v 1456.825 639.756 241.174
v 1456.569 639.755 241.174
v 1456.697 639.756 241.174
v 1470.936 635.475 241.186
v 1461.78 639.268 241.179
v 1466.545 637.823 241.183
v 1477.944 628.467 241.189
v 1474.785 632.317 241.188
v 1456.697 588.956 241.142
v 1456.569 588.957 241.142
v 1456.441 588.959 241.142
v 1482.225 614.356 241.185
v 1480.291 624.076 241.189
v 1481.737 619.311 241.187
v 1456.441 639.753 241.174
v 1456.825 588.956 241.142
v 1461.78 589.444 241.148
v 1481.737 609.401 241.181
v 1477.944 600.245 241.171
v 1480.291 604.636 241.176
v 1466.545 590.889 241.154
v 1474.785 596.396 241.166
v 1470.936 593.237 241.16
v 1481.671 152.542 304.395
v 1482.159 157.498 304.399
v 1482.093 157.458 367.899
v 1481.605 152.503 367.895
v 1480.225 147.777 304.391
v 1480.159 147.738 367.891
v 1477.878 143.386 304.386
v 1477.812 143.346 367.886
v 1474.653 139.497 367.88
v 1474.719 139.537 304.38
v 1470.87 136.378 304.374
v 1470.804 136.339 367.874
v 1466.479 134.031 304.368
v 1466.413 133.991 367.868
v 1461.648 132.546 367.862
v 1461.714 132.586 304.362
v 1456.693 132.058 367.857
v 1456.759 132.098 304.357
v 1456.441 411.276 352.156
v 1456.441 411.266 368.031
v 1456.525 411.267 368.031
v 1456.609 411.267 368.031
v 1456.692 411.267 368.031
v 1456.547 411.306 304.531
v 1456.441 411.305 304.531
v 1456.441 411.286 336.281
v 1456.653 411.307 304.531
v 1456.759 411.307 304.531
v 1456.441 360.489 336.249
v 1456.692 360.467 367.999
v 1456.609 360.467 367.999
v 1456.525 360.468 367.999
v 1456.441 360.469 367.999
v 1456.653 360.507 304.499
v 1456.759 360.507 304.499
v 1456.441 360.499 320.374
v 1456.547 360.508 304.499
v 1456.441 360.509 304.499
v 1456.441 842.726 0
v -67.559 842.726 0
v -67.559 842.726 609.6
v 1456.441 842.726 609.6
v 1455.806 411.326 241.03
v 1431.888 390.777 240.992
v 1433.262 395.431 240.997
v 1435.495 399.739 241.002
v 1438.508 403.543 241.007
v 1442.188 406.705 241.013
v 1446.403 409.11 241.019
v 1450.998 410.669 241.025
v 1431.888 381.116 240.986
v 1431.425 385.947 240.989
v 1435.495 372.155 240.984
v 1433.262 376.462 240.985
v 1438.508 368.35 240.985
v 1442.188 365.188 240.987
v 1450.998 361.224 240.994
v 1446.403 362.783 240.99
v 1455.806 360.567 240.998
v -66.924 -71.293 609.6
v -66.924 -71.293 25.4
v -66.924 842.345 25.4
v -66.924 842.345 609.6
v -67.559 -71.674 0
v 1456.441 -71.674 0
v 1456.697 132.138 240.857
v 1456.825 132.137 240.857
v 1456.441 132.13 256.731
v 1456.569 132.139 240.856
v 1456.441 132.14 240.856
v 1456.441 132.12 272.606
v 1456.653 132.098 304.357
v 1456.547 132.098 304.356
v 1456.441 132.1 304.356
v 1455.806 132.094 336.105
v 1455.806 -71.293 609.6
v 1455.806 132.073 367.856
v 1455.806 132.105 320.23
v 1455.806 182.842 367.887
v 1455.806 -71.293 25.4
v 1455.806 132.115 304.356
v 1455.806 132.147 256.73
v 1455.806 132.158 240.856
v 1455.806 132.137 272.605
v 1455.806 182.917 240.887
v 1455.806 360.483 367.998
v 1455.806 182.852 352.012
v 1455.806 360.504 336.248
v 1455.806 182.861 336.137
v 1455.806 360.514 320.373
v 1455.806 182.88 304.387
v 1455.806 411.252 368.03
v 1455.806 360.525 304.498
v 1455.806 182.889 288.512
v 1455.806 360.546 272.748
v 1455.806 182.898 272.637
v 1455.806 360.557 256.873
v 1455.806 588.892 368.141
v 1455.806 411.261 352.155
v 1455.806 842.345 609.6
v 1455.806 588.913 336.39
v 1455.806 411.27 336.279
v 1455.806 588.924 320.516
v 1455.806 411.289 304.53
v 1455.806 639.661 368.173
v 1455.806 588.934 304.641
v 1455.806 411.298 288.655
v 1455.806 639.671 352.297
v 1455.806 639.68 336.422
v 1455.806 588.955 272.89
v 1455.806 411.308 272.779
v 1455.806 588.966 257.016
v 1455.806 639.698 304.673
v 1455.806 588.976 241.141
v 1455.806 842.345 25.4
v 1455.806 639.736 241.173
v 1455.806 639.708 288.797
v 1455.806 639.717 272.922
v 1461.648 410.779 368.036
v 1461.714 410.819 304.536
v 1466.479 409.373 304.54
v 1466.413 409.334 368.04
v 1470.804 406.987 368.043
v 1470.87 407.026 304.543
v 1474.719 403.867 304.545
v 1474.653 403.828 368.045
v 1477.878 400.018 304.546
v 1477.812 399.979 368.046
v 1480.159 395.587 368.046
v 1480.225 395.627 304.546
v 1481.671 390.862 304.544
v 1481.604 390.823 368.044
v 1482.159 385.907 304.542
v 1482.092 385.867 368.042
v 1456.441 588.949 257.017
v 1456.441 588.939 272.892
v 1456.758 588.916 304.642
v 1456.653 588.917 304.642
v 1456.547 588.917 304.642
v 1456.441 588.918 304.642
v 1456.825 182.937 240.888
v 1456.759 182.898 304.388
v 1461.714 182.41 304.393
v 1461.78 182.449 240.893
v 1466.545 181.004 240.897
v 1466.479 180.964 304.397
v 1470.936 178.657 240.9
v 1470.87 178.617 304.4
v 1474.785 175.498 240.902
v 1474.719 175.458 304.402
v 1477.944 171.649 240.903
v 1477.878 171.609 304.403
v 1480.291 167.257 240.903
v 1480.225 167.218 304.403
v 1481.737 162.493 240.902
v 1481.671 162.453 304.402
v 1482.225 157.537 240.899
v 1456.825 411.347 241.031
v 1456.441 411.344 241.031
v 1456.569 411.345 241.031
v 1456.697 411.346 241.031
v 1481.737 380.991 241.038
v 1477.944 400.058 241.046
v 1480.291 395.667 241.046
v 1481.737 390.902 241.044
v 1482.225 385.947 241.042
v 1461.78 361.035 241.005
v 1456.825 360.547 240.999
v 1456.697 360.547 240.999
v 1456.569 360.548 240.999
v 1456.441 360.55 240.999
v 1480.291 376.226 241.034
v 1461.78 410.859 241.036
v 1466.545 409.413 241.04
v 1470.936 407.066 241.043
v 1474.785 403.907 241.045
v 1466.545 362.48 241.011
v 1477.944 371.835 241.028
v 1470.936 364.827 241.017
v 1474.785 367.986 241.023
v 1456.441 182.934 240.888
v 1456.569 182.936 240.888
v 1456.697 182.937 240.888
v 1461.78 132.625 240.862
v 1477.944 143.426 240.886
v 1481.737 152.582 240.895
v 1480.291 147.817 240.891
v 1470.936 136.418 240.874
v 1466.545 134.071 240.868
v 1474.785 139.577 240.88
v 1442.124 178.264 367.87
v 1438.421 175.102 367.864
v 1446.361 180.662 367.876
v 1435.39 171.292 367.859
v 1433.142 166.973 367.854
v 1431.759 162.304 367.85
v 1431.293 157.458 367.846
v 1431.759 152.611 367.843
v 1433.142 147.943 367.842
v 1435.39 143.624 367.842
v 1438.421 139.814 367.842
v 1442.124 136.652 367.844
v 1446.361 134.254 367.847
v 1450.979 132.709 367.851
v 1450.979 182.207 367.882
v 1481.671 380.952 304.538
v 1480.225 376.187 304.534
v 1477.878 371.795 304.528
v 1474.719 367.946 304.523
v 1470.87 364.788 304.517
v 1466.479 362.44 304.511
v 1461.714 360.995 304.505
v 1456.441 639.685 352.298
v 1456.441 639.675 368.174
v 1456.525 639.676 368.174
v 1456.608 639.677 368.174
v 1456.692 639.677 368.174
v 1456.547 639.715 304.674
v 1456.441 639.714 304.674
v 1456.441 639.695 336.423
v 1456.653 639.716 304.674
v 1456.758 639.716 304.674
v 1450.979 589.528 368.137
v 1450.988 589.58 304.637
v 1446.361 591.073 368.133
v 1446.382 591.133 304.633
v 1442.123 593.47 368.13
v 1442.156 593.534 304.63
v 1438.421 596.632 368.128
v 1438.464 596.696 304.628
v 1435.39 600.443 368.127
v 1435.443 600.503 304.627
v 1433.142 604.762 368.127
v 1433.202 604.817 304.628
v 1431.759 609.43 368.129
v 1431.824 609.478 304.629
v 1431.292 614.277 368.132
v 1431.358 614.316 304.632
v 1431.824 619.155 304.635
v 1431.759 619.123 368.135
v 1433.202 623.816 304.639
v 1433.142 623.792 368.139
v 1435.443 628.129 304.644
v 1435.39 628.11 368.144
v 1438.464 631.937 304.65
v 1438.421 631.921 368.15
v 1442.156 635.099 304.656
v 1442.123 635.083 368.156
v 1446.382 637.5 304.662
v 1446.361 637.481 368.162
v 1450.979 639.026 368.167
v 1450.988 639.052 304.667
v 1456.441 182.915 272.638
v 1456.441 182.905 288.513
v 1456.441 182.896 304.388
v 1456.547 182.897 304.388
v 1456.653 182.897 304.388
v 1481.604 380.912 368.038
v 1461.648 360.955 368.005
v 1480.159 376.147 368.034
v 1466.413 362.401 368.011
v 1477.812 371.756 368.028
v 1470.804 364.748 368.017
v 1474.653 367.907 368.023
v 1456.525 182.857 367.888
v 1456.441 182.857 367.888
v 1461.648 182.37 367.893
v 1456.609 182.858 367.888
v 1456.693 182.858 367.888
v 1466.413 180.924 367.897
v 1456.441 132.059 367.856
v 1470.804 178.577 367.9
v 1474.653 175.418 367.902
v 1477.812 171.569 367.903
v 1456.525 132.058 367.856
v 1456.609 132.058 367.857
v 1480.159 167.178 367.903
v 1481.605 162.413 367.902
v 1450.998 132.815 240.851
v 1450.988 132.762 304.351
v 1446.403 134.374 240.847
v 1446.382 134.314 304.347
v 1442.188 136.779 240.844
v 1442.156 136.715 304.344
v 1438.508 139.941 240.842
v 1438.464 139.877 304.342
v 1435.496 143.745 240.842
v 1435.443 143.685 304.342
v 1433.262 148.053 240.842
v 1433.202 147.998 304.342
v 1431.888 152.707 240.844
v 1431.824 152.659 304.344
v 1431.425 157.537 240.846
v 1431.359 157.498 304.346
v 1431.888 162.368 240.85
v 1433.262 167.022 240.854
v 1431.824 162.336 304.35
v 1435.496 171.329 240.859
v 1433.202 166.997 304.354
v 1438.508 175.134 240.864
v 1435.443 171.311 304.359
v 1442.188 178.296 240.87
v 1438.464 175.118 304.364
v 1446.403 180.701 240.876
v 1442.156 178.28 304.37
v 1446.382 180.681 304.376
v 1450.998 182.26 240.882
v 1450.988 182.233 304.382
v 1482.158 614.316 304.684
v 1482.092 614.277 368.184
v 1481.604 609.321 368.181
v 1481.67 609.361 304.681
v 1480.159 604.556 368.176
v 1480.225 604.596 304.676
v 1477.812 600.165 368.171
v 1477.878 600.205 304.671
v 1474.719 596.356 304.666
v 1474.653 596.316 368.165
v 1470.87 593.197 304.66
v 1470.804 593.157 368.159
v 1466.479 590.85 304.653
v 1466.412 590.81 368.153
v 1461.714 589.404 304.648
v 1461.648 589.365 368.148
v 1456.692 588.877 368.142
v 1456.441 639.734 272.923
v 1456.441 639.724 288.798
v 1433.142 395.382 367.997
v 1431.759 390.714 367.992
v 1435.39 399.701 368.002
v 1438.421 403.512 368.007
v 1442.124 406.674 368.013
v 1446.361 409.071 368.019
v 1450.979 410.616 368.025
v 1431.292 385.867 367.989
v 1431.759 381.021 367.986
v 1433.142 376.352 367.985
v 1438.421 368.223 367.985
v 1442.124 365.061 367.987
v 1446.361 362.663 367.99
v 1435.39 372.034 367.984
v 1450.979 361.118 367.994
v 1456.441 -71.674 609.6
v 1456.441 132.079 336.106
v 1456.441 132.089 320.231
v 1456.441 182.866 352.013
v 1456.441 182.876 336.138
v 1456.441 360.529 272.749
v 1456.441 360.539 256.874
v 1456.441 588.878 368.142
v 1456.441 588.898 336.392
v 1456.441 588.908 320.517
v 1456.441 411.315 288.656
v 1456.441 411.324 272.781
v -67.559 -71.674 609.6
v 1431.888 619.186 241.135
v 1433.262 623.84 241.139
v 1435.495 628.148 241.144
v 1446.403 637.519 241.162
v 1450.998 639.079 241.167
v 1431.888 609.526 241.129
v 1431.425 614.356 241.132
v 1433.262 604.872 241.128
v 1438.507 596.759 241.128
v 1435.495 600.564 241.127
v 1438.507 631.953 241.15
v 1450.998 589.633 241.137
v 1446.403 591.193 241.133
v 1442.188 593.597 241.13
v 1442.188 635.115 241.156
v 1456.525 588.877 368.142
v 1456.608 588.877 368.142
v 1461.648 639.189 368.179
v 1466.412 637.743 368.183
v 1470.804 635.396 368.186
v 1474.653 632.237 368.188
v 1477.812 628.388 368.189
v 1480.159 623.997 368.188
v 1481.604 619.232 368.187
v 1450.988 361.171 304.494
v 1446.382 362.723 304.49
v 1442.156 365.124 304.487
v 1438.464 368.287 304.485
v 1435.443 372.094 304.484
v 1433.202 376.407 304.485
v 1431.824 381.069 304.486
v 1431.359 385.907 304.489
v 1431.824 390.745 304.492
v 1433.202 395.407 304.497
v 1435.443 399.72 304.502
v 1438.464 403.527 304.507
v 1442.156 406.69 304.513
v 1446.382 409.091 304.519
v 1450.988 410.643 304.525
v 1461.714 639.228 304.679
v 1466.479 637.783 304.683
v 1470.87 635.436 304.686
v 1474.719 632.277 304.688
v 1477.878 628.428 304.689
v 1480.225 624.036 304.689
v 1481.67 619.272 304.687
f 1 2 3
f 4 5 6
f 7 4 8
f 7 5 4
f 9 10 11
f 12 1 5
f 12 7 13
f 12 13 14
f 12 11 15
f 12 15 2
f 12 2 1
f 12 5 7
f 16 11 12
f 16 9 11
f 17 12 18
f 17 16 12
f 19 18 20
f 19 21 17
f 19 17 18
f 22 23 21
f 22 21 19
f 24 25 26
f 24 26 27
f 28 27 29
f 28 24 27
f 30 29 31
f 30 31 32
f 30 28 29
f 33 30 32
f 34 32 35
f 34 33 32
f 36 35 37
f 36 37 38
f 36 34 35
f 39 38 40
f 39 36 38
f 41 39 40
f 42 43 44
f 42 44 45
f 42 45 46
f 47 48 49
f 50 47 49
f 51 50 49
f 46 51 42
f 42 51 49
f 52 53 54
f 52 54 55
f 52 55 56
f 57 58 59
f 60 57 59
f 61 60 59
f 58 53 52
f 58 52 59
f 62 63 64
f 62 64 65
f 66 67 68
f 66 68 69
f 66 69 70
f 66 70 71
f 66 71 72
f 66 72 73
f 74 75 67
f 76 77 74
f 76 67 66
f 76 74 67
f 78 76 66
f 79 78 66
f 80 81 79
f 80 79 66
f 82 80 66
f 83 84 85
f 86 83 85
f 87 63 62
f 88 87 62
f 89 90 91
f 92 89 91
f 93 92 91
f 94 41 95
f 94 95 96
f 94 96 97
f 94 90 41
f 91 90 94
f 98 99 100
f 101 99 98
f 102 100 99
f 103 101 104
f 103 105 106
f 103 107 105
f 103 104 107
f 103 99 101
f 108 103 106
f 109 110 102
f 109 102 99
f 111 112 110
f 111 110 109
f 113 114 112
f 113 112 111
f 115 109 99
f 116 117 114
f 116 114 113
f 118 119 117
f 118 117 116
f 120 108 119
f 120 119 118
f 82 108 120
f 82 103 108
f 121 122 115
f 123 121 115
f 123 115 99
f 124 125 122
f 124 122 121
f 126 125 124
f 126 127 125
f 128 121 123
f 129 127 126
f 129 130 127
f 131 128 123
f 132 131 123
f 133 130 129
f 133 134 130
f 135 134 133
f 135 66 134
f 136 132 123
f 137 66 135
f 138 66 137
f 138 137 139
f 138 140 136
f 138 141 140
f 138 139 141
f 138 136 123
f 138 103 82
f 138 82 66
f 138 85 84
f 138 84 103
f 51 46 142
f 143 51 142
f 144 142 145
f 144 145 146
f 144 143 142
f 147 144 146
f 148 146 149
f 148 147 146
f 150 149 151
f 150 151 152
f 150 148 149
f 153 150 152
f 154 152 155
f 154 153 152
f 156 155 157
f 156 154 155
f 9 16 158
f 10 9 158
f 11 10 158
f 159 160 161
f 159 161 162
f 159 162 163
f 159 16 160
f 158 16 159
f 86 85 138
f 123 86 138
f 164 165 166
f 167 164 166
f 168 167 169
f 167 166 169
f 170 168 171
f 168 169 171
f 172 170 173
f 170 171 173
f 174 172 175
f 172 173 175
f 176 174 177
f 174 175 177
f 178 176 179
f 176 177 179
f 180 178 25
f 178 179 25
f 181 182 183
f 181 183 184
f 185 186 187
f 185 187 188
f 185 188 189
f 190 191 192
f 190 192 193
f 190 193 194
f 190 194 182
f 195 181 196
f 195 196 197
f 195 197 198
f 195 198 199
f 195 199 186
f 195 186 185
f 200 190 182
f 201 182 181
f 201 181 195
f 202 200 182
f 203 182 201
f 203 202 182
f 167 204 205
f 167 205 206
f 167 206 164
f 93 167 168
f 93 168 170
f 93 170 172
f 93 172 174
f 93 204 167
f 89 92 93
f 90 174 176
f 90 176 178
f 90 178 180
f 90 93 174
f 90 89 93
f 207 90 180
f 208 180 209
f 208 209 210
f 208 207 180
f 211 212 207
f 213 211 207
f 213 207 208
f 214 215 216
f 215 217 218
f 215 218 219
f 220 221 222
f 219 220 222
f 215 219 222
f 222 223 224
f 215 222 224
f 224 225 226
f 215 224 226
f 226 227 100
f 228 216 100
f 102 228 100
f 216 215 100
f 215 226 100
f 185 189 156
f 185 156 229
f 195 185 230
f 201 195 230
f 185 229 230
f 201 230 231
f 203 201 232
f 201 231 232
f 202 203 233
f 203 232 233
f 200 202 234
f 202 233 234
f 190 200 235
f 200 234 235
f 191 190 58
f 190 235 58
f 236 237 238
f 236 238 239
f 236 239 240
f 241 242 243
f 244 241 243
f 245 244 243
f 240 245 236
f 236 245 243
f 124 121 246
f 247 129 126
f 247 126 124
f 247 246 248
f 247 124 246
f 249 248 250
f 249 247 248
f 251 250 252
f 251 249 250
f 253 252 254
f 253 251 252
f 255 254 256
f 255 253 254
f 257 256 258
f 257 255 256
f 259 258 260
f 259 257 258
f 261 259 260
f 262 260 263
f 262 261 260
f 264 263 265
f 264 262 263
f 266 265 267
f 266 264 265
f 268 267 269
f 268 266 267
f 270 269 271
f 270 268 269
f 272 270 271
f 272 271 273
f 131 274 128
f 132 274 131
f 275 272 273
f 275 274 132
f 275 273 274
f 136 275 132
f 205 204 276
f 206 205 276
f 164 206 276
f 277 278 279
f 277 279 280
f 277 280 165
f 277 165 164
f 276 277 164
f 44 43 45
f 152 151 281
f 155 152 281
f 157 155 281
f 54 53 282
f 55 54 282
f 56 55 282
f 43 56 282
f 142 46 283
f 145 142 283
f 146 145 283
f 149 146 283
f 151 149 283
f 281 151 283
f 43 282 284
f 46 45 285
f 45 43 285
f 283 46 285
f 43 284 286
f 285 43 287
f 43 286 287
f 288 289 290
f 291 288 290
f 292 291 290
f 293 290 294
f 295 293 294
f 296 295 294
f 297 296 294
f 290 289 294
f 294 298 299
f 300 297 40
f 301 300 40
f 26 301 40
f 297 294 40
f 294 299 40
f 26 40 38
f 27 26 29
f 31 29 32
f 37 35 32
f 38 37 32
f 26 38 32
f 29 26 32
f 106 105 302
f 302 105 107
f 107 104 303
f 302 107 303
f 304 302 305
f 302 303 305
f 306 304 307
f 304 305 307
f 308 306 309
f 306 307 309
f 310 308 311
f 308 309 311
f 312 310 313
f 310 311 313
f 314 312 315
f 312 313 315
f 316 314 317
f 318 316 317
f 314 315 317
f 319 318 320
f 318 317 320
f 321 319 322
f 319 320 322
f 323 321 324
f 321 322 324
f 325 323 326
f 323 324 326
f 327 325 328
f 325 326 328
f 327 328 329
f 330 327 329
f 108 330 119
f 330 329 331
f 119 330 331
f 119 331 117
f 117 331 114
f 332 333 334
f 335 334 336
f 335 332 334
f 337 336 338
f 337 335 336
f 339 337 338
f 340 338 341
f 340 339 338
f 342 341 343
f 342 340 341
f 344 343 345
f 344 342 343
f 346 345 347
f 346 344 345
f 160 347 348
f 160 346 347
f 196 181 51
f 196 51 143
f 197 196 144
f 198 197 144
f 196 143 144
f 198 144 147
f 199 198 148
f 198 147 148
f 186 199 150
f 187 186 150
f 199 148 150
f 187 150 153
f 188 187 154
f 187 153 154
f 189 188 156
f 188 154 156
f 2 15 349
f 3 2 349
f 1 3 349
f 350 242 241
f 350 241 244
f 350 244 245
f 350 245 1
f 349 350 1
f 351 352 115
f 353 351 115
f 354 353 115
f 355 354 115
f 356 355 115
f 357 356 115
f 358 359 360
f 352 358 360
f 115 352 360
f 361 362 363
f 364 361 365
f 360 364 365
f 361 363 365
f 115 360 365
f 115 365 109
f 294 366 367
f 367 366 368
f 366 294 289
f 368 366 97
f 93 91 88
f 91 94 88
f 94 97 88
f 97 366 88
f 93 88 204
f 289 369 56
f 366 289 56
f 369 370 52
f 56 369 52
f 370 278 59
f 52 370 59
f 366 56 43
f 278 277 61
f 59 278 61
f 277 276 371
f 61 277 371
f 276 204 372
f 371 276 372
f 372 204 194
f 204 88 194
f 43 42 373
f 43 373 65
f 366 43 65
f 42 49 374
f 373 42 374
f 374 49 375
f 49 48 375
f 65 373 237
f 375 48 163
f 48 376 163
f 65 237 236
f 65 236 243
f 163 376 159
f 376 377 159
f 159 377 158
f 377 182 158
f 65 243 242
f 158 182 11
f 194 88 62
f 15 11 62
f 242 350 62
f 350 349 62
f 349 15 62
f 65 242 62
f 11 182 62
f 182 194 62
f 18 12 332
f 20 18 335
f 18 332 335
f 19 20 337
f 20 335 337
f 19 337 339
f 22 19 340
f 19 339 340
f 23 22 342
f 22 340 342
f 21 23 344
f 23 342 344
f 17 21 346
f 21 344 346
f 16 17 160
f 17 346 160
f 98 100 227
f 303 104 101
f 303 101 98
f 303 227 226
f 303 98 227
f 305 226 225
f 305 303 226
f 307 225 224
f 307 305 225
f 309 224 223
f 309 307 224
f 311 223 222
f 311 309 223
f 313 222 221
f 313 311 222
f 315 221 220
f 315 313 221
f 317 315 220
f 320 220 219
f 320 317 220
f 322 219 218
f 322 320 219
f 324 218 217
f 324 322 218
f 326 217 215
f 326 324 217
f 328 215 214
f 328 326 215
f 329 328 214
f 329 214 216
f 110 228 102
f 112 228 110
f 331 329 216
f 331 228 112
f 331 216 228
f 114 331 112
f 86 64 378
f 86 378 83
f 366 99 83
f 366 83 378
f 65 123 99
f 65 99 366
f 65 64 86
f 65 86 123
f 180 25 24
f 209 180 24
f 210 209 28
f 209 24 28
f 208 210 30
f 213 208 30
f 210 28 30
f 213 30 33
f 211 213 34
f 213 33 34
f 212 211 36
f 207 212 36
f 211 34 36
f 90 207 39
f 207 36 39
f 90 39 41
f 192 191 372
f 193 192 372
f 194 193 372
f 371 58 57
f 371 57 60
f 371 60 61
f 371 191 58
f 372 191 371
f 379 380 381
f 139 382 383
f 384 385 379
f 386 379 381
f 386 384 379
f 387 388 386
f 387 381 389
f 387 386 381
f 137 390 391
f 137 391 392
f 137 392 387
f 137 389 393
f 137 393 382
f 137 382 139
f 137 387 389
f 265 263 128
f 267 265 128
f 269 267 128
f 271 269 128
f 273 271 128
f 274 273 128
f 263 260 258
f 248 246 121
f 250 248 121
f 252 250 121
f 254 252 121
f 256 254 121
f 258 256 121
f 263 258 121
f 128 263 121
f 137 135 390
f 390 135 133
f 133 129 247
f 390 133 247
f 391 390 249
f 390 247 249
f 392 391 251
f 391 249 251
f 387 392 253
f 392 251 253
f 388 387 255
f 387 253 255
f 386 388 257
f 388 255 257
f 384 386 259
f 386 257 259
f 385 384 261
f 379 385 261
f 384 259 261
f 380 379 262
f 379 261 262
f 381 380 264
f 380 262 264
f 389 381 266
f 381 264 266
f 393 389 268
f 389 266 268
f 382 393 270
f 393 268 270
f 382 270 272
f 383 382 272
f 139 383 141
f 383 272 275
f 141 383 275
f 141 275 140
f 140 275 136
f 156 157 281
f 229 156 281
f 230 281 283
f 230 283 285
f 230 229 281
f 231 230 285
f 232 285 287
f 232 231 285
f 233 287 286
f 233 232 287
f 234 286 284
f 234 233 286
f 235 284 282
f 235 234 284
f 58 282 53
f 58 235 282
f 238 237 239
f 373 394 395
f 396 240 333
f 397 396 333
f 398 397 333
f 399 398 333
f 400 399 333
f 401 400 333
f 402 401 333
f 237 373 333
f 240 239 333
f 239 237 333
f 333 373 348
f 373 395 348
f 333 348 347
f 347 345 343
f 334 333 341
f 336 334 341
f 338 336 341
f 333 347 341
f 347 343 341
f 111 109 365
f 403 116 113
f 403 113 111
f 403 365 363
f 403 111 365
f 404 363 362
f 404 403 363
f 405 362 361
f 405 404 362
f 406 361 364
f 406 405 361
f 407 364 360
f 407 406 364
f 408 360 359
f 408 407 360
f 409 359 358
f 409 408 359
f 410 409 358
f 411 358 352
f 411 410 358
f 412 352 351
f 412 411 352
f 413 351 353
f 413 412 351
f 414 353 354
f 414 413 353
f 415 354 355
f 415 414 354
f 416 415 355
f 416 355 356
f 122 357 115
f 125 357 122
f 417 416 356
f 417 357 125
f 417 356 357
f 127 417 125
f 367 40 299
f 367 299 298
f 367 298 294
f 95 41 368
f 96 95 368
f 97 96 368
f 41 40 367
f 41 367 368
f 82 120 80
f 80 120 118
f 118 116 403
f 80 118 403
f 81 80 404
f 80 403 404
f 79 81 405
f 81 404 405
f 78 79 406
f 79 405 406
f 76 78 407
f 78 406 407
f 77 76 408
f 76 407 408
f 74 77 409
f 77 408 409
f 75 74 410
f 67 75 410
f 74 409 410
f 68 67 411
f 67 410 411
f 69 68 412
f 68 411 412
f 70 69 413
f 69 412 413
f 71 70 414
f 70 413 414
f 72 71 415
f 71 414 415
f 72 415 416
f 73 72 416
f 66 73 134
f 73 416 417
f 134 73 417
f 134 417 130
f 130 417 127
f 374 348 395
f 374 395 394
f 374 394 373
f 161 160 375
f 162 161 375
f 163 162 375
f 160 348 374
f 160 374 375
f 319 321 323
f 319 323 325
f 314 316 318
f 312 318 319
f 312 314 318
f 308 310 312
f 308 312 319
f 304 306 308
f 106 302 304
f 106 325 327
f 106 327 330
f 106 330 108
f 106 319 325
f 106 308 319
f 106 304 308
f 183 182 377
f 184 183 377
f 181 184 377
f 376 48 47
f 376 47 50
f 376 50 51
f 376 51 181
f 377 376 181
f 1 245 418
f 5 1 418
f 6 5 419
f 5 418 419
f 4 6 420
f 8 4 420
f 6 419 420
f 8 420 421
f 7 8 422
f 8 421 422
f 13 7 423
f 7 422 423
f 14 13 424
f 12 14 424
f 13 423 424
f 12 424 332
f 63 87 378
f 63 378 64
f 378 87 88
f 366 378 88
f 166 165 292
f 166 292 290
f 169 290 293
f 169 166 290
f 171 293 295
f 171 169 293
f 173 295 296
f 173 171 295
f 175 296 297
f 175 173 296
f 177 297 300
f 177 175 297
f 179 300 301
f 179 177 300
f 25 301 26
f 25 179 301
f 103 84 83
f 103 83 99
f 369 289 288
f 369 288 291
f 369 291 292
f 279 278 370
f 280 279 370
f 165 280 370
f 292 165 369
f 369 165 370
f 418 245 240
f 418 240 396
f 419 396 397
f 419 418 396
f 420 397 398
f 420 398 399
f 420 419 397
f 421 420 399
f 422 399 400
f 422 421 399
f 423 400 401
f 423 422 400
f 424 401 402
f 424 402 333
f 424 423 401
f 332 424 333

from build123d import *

# Parameters (mm, degrees)
F1_W     = 1524
F1_H     = 914.4
F1_W_2   = 1522.73
F1_H_2   = 913.638
F2_DEPTH = 609.6
F0_W     = 1524
F0_H     = 914.4
F3_DEPTH = 25.4
F6_DEPTH = 63.5


with BuildPart() as f2:
    # F1 (on face) → F2 (new body)
    with BuildSketch(Plane.XY):
        with Locations((694.4408099055, 385.5257871866)):
            Rectangle(F1_W, F1_H)
        with Locations((694.4408099055, 385.5257871866)):
            Rectangle(F1_W_2, F1_H_2, mode=Mode.SUBTRACT)
    extrude(amount=F2_DEPTH)

    # F1 (on face) + F0 (on Top) → F3 (join)
    with BuildSketch(Plane.XY):
        with Locations((694.4408099055, 385.5257871866)):
            Rectangle(F1_W_2, F1_H_2)
    with BuildSketch(Plane.XY):
        with Locations((694.4408099055, 385.5257871866)):
            Rectangle(F0_W, F0_H)
    extrude(amount=F3_DEPTH)

    # F5 (on mid) → F6 (join, symmetric)
    with BuildSketch(Plane(origin=(-0.3153710141, -0.1892226085, 302.7561735554), x_dir=(0.9999994575, -6.51e-07, 0.0010416657), z_dir=(0.0010416659, 0.0006249995, -0.9999992622))):
        with BuildLine():
            ThreePointArc((1482.474916731, -157.6878010367), (1475.0354348197, -139.727294641), (1457.0749332675, -132.2878010367))
            Line((1457.0749332675, -132.2878010367), (1457.074916731, -157.6878010367))
            Line((1457.074916731, -157.6878010367), (1457.0749001946, -183.0878010367))
            ThreePointArc((1457.0749001946, -183.0878010367), (1475.0354231266, -175.6483191253), (1482.474916731, -157.6878010367))
        make_face()
        with BuildLine():
            ThreePointArc((1482.4747680271, -386.097211777), (1475.0352861157, -368.1367053814), (1457.0747845635, -360.697211777))
            Line((1457.0747845635, -360.697211777), (1457.0747680271, -386.097211777))
            Line((1457.0747680271, -386.097211777), (1457.0747514906, -411.497211777))
            ThreePointArc((1457.0747514906, -411.497211777), (1475.0352744227, -404.0577298657), (1482.4747680271, -386.097211777))
        make_face()
        with BuildLine():
            ThreePointArc((1482.4746193231, -614.5066225174), (1475.0351374118, -596.5461161218), (1457.0746358596, -589.1066225174))
            Line((1457.0746358596, -589.1066225174), (1457.0746193231, -614.5066225174))
            Line((1457.0746193231, -614.5066225174), (1457.0746027867, -639.9066225174))
            ThreePointArc((1457.0746027867, -639.9066225174), (1475.0351257188, -632.467140606), (1482.4746193231, -614.5066225174))
        make_face()
        with BuildLine():
            Line((1457.0746193231, -614.5066225174), (1457.0746358596, -589.1066225174))
            ThreePointArc((1457.0746358596, -589.1066225174), (1431.6746193231, -614.5066059809), (1457.0746027867, -639.9066225174))
            Line((1457.0746027867, -639.9066225174), (1457.0746193231, -614.5066225174))
        make_face()
        with BuildLine():
            Line((1457.0747680271, -386.097211777), (1457.0747845635, -360.697211777))
            ThreePointArc((1457.0747845635, -360.697211777), (1431.6747680271, -386.0971952406), (1457.0747514906, -411.497211777))
            Line((1457.0747514906, -411.497211777), (1457.0747680271, -386.097211777))
        make_face()
        with BuildLine():
            Line((1457.074916731, -157.6878010367), (1457.0749332675, -132.2878010367))
            ThreePointArc((1457.0749332675, -132.2878010367), (1431.674916731, -157.6877845002), (1457.0749001946, -183.0878010367))
            Line((1457.0749001946, -183.0878010367), (1457.074916731, -157.6878010367))
        make_face()
    extrude(amount=F6_DEPTH, both=True)


solid = f2.part
